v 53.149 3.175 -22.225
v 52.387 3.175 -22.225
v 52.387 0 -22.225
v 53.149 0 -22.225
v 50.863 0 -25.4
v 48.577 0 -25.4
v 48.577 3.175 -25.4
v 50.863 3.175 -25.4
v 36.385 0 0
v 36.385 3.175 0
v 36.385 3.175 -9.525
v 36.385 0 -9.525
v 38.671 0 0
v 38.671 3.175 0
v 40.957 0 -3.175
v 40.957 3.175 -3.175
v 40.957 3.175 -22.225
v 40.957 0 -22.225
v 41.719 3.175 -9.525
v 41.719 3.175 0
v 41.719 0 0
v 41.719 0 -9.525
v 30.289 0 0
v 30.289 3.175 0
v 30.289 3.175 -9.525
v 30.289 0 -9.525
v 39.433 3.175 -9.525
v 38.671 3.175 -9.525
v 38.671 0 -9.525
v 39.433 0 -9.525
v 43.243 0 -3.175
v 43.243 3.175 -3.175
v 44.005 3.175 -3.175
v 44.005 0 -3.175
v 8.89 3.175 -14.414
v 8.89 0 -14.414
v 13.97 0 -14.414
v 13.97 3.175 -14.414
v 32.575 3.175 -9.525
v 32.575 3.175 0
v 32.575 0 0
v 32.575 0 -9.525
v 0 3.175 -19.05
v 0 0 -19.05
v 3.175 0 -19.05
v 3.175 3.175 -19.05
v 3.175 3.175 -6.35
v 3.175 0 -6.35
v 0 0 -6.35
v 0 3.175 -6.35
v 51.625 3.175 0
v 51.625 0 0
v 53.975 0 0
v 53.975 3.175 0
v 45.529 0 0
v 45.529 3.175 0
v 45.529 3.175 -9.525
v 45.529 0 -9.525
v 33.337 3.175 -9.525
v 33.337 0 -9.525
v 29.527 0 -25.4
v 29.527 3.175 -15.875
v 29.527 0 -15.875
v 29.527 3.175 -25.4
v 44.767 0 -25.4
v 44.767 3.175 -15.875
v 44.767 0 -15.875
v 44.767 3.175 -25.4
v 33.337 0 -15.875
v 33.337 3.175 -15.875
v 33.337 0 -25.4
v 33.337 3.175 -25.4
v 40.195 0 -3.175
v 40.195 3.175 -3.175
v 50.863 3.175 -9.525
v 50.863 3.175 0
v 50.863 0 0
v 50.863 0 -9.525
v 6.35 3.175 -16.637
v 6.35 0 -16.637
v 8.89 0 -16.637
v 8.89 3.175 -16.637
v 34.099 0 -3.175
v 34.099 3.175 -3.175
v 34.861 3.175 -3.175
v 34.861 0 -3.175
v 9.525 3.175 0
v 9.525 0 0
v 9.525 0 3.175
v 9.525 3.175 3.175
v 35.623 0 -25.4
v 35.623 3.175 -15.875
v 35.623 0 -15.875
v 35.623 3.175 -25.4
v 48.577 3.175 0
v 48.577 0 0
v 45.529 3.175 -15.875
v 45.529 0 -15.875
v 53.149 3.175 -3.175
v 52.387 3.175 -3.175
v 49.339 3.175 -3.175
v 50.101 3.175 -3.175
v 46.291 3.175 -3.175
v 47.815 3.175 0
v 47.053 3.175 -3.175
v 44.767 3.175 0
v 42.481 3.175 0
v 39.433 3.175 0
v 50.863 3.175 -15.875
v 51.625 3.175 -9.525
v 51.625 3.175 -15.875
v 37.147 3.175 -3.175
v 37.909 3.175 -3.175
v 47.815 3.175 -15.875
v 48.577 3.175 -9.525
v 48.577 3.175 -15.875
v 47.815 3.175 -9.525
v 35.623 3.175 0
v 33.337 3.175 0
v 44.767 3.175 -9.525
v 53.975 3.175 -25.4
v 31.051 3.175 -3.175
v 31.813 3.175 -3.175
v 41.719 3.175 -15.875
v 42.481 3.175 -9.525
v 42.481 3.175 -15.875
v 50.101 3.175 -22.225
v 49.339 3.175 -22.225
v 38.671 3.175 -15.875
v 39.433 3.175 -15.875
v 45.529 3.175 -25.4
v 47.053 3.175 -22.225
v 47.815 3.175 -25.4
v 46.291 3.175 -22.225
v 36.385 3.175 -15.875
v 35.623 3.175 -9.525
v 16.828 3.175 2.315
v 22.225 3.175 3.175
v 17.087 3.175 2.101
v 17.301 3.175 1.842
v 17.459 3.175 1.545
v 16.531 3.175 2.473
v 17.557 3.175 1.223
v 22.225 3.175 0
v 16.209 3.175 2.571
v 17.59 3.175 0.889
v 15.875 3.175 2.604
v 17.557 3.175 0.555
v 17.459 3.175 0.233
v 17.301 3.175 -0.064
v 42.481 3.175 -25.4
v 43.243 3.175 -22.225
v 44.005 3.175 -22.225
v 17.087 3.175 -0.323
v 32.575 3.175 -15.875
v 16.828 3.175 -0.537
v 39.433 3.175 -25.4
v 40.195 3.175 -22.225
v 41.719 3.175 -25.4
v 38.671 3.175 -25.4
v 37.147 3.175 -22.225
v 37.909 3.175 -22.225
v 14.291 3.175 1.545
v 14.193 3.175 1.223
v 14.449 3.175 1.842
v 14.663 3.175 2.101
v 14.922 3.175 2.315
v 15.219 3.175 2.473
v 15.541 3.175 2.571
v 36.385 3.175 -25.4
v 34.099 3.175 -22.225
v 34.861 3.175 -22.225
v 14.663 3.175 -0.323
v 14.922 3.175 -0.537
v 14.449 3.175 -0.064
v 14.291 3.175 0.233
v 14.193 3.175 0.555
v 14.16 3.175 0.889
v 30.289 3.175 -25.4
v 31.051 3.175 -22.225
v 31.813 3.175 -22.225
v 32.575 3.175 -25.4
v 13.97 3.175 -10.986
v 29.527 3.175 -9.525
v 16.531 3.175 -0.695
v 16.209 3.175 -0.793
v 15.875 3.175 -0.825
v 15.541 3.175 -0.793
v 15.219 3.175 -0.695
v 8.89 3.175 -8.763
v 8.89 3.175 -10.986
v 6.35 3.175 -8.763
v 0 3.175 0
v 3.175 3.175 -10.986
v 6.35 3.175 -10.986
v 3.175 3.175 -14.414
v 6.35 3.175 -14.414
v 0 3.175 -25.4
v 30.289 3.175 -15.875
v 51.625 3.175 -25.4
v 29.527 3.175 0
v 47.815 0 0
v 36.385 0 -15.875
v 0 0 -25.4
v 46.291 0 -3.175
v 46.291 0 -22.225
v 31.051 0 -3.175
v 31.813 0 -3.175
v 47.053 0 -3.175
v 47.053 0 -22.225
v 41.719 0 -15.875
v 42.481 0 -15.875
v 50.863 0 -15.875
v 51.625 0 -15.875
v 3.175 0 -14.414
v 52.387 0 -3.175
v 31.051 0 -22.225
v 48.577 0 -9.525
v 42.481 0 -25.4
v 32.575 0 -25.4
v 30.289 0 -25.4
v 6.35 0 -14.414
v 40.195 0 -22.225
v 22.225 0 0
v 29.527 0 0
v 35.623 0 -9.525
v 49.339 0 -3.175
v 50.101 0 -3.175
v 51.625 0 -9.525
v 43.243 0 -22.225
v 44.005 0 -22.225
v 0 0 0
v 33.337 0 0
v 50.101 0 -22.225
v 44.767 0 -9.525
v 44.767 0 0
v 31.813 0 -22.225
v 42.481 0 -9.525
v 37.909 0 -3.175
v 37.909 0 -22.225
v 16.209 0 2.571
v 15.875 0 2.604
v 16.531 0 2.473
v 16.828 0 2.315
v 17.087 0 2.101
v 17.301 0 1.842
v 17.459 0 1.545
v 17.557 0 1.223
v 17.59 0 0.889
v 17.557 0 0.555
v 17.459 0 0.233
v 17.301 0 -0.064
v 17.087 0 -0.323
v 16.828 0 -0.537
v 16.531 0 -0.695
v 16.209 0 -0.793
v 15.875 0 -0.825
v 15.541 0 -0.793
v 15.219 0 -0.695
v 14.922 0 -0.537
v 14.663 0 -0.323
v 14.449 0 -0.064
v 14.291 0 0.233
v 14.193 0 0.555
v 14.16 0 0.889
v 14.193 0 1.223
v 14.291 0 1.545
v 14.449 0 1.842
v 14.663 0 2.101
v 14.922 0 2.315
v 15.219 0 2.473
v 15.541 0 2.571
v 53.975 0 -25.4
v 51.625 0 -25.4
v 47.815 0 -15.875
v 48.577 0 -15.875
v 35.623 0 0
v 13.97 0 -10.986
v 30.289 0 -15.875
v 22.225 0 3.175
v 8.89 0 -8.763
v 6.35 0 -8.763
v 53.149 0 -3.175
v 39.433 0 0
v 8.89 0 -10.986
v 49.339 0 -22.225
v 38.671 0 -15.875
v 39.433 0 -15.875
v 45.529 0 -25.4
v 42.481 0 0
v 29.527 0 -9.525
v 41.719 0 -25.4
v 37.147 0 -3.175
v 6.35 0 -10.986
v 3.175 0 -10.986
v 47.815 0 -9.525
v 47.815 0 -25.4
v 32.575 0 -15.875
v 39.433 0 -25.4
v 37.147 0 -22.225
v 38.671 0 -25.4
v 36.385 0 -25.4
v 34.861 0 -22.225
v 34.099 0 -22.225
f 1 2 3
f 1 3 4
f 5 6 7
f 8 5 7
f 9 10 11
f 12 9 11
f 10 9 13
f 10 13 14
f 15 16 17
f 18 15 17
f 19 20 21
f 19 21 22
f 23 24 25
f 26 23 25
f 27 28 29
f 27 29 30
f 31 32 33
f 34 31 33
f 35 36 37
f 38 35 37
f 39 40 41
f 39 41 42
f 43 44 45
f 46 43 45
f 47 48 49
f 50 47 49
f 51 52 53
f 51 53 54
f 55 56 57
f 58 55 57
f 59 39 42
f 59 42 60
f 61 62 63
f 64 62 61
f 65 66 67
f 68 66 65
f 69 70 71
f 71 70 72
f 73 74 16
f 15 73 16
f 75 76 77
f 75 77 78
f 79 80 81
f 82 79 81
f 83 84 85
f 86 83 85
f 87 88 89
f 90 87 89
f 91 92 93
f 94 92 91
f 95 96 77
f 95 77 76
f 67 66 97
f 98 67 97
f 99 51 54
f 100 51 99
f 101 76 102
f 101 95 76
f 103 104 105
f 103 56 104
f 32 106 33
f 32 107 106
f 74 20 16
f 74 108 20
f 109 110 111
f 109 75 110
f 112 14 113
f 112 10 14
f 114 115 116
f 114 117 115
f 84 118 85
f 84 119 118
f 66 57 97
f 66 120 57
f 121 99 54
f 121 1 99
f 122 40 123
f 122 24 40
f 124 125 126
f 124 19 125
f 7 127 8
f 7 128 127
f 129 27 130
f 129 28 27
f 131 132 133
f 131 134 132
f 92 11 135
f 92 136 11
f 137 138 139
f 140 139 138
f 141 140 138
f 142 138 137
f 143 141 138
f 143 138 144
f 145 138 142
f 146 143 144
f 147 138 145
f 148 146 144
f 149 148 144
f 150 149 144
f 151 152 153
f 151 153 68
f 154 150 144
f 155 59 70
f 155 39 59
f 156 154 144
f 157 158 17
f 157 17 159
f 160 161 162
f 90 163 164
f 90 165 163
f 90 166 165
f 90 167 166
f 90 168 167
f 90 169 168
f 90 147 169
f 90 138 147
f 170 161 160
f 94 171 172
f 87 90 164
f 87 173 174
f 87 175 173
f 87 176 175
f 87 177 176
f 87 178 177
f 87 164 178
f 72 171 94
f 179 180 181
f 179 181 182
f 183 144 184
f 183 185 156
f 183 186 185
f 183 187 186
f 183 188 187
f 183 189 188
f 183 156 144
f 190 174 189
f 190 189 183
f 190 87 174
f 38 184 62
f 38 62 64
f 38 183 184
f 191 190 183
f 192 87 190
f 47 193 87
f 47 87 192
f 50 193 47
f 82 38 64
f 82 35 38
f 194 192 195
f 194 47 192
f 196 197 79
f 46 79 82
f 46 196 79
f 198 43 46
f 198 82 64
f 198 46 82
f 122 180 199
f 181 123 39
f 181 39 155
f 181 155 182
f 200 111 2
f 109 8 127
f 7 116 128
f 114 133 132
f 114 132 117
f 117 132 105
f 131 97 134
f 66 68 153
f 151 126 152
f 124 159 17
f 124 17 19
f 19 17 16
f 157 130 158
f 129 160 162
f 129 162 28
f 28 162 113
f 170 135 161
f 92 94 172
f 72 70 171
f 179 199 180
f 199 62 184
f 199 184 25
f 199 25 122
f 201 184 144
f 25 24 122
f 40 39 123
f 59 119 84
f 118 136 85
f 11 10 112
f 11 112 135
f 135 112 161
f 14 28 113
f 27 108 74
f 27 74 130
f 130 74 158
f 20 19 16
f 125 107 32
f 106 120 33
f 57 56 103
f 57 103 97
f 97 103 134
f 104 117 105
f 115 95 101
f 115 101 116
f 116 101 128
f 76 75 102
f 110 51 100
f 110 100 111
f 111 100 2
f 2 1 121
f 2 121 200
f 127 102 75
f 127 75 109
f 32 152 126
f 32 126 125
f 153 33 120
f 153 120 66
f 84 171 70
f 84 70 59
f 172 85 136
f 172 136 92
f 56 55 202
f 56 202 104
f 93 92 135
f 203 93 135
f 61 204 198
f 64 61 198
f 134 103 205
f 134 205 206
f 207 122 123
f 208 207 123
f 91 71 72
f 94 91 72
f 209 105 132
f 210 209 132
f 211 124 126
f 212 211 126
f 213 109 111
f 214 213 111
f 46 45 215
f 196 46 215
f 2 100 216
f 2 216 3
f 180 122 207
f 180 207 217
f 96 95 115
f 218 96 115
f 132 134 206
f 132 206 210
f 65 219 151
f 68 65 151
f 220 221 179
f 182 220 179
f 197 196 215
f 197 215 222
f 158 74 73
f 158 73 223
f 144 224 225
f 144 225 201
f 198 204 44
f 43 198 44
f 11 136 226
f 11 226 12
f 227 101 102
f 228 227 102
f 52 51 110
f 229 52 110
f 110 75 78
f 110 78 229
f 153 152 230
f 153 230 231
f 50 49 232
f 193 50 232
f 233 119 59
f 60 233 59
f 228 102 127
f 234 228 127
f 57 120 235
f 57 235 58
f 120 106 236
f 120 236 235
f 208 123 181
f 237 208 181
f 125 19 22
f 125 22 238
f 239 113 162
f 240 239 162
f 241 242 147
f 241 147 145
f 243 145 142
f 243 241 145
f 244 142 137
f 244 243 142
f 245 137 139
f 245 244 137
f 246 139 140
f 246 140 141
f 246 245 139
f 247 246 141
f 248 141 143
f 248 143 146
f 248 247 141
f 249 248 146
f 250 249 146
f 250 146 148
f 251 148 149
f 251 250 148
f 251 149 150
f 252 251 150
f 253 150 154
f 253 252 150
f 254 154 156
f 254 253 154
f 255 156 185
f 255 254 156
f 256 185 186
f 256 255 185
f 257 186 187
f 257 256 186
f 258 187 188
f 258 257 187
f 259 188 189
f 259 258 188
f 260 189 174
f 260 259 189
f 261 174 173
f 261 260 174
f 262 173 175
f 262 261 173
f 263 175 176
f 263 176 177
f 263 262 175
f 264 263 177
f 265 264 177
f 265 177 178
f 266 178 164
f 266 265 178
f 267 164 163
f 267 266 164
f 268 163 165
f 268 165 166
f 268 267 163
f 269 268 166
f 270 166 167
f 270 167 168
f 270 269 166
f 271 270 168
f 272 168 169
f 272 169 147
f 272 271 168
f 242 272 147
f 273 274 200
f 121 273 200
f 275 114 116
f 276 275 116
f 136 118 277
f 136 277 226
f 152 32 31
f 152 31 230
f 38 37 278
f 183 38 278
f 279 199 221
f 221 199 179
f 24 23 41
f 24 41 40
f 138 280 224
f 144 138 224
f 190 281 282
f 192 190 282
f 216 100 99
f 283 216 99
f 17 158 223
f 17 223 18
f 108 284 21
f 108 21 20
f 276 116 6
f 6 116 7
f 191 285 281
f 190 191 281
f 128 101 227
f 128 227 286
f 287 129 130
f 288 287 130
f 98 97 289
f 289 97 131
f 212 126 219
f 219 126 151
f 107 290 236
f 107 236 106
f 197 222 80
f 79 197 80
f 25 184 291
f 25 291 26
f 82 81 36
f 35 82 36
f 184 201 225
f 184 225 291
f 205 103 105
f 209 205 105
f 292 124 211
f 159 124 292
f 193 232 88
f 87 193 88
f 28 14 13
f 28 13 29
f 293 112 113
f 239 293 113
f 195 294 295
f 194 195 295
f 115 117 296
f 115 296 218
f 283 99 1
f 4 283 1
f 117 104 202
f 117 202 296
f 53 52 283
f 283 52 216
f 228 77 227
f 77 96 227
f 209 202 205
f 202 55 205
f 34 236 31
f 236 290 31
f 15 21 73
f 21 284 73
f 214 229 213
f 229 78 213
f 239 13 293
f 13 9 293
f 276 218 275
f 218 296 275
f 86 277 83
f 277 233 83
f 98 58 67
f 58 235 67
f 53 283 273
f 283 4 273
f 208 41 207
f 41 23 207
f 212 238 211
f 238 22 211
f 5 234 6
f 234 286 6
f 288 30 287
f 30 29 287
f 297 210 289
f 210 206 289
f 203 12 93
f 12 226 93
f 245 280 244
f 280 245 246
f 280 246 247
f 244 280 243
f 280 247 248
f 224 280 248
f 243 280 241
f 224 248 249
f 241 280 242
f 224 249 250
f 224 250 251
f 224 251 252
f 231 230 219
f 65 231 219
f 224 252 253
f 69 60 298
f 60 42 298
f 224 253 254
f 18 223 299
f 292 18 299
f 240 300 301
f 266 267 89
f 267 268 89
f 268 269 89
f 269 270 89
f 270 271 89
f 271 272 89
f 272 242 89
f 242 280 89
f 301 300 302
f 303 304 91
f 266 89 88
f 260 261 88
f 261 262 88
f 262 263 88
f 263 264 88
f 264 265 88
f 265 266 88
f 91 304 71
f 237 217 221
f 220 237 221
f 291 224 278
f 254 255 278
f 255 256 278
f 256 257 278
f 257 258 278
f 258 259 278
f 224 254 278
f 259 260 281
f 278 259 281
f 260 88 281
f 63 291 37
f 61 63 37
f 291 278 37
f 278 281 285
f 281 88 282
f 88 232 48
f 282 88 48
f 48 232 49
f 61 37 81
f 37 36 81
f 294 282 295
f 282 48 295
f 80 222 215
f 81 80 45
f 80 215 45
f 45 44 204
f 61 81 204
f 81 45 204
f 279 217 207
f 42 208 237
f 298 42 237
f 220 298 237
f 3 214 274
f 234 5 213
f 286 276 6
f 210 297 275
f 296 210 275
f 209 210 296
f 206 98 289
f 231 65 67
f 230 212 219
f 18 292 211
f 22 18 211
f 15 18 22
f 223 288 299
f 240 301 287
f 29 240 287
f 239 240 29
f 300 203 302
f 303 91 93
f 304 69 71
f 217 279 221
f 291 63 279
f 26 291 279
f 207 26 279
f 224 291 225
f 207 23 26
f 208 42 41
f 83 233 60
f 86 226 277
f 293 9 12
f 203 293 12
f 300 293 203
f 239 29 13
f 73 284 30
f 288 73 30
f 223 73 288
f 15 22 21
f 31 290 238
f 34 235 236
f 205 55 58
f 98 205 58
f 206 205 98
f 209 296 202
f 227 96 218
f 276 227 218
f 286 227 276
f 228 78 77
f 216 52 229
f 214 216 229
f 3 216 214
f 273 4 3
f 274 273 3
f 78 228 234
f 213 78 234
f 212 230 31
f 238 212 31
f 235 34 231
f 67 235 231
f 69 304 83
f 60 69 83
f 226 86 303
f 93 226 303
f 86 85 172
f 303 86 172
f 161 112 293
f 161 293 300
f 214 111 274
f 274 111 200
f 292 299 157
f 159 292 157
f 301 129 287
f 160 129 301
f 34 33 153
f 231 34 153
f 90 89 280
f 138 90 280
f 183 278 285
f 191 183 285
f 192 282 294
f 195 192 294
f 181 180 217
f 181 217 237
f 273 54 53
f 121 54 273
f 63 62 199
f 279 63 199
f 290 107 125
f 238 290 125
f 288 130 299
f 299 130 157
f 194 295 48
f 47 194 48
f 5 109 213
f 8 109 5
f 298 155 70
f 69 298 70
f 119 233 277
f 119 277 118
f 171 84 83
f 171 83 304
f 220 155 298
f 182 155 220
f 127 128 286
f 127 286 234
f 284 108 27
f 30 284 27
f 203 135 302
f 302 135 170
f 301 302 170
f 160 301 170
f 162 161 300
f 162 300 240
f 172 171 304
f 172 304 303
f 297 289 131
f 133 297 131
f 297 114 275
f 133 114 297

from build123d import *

# Parameters (mm, degrees)
SKETCH1_R           = 1.7145
BOSS_EXTRUDE1_DEPTH = 3.175
SKETCH3_W           = 25.4
SKETCH3_H           = 3.175
BOSS_EXTRUDE2_DEPTH = 25.4
SKETCH4_W           = 0.762
SKETCH4_H           = 9.525
SKETCH4_H_2         = 19.05
CUT_EXTRUDE2_DEPTH  = 60.737268518


with BuildPart() as part:
    # Sketch1 → Boss-Extrude1 (new body)
    with BuildSketch(Plane(origin=(0, 0, 0), x_dir=(1, 0, 0), z_dir=(0, 1, 0))):
        Polygon((0, 19.05), (3.175, 19.05), (3.175, 14.4145), (6.35, 14.4145), (6.35, 16.637), (8.89, 16.637), (8.89, 14.4145), (13.97, 14.4145), (13.97, 10.9855), (8.89, 10.9855), (8.89, 8.763), (6.35, 8.763), (6.35, 10.9855), (3.175, 10.9855), (3.175, 6.35), (0, 6.35), (0, 0), (9.525, 0), (9.525, -3.175), (22.225, -3.175), (22.225, 0), (28.575, 0), (28.575, 25.4), (0, 25.4), align=None)
        with Locations(Location((15.875, -0.889, 0), (0, 0, 270))):
            Circle(SKETCH1_R, mode=Mode.SUBTRACT)
    extrude(amount=BOSS_EXTRUDE1_DEPTH)

    # Sketch3 → Boss-Extrude2 (add)
    with BuildSketch(Plane(origin=(28.575, 0, 0), x_dir=(0, 0, -1), z_dir=(1, 0, 0))):
        with Locations((12.7, 1.5875)):
            Rectangle(SKETCH3_W, SKETCH3_H)
    extrude(amount=BOSS_EXTRUDE2_DEPTH)

    # Sketch4 → Cut-Extrude2 (cut, through all)
    with BuildSketch(Plane(origin=(0, 3.175, 0), x_dir=(1, 0, 0), z_dir=(0, 1, 0))):
        with Locations((29.908251949, 4.7625)):
            Rectangle(SKETCH4_W, SKETCH4_H)
        with Locations((31.432251949, 12.7)):
            Rectangle(SKETCH4_W, SKETCH4_H_2)
        with Locations((29.908251949, 20.6375)):
            Rectangle(SKETCH4_W, SKETCH4_H)
        with Locations((32.956251949, 4.7625)):
            Rectangle(SKETCH4_W, SKETCH4_H)
        with Locations((34.480251949, 12.7)):
            Rectangle(SKETCH4_W, SKETCH4_H_2)
        with Locations((32.956251949, 20.6375)):
            Rectangle(SKETCH4_W, SKETCH4_H)
        with Locations((36.004251949, 4.7625)):
            Rectangle(SKETCH4_W, SKETCH4_H)
        with Locations((37.528251949, 12.7)):
            Rectangle(SKETCH4_W, SKETCH4_H_2)
        with Locations((36.004251949, 20.6375)):
            Rectangle(SKETCH4_W, SKETCH4_H)
        with Locations((39.052251949, 4.7625)):
            Rectangle(SKETCH4_W, SKETCH4_H)
        with Locations((40.576251949, 12.7)):
            Rectangle(SKETCH4_W, SKETCH4_H_2)
        with Locations((39.052251949, 20.6375)):
            Rectangle(SKETCH4_W, SKETCH4_H)
        with Locations((42.100251949, 4.7625)):
            Rectangle(SKETCH4_W, SKETCH4_H)
        with Locations((43.624251949, 12.7)):
            Rectangle(SKETCH4_W, SKETCH4_H_2)
        with Locations((42.100251949, 20.6375)):
            Rectangle(SKETCH4_W, SKETCH4_H)
        with Locations((45.148251949, 4.7625)):
            Rectangle(SKETCH4_W, SKETCH4_H)
        with Locations((46.672251949, 12.7)):
            Rectangle(SKETCH4_W, SKETCH4_H_2)
        with Locations((45.148251949, 20.6375)):
            Rectangle(SKETCH4_W, SKETCH4_H)
        with Locations((48.196251949, 4.7625)):
            Rectangle(SKETCH4_W, SKETCH4_H)
        with Locations((49.720251949, 12.7)):
            Rectangle(SKETCH4_W, SKETCH4_H_2)
        with Locations((48.196251949, 20.6375)):
            Rectangle(SKETCH4_W, SKETCH4_H)
        with Locations((51.244251949, 4.7625)):
            Rectangle(SKETCH4_W, SKETCH4_H)
        with Locations((52.768251949, 12.7)):
            Rectangle(SKETCH4_W, SKETCH4_H_2)
        with Locations((51.244251949, 20.6375)):
            Rectangle(SKETCH4_W, SKETCH4_H)
    extrude(amount=-CUT_EXTRUDE2_DEPTH, mode=Mode.SUBTRACT)


solid = part.part
